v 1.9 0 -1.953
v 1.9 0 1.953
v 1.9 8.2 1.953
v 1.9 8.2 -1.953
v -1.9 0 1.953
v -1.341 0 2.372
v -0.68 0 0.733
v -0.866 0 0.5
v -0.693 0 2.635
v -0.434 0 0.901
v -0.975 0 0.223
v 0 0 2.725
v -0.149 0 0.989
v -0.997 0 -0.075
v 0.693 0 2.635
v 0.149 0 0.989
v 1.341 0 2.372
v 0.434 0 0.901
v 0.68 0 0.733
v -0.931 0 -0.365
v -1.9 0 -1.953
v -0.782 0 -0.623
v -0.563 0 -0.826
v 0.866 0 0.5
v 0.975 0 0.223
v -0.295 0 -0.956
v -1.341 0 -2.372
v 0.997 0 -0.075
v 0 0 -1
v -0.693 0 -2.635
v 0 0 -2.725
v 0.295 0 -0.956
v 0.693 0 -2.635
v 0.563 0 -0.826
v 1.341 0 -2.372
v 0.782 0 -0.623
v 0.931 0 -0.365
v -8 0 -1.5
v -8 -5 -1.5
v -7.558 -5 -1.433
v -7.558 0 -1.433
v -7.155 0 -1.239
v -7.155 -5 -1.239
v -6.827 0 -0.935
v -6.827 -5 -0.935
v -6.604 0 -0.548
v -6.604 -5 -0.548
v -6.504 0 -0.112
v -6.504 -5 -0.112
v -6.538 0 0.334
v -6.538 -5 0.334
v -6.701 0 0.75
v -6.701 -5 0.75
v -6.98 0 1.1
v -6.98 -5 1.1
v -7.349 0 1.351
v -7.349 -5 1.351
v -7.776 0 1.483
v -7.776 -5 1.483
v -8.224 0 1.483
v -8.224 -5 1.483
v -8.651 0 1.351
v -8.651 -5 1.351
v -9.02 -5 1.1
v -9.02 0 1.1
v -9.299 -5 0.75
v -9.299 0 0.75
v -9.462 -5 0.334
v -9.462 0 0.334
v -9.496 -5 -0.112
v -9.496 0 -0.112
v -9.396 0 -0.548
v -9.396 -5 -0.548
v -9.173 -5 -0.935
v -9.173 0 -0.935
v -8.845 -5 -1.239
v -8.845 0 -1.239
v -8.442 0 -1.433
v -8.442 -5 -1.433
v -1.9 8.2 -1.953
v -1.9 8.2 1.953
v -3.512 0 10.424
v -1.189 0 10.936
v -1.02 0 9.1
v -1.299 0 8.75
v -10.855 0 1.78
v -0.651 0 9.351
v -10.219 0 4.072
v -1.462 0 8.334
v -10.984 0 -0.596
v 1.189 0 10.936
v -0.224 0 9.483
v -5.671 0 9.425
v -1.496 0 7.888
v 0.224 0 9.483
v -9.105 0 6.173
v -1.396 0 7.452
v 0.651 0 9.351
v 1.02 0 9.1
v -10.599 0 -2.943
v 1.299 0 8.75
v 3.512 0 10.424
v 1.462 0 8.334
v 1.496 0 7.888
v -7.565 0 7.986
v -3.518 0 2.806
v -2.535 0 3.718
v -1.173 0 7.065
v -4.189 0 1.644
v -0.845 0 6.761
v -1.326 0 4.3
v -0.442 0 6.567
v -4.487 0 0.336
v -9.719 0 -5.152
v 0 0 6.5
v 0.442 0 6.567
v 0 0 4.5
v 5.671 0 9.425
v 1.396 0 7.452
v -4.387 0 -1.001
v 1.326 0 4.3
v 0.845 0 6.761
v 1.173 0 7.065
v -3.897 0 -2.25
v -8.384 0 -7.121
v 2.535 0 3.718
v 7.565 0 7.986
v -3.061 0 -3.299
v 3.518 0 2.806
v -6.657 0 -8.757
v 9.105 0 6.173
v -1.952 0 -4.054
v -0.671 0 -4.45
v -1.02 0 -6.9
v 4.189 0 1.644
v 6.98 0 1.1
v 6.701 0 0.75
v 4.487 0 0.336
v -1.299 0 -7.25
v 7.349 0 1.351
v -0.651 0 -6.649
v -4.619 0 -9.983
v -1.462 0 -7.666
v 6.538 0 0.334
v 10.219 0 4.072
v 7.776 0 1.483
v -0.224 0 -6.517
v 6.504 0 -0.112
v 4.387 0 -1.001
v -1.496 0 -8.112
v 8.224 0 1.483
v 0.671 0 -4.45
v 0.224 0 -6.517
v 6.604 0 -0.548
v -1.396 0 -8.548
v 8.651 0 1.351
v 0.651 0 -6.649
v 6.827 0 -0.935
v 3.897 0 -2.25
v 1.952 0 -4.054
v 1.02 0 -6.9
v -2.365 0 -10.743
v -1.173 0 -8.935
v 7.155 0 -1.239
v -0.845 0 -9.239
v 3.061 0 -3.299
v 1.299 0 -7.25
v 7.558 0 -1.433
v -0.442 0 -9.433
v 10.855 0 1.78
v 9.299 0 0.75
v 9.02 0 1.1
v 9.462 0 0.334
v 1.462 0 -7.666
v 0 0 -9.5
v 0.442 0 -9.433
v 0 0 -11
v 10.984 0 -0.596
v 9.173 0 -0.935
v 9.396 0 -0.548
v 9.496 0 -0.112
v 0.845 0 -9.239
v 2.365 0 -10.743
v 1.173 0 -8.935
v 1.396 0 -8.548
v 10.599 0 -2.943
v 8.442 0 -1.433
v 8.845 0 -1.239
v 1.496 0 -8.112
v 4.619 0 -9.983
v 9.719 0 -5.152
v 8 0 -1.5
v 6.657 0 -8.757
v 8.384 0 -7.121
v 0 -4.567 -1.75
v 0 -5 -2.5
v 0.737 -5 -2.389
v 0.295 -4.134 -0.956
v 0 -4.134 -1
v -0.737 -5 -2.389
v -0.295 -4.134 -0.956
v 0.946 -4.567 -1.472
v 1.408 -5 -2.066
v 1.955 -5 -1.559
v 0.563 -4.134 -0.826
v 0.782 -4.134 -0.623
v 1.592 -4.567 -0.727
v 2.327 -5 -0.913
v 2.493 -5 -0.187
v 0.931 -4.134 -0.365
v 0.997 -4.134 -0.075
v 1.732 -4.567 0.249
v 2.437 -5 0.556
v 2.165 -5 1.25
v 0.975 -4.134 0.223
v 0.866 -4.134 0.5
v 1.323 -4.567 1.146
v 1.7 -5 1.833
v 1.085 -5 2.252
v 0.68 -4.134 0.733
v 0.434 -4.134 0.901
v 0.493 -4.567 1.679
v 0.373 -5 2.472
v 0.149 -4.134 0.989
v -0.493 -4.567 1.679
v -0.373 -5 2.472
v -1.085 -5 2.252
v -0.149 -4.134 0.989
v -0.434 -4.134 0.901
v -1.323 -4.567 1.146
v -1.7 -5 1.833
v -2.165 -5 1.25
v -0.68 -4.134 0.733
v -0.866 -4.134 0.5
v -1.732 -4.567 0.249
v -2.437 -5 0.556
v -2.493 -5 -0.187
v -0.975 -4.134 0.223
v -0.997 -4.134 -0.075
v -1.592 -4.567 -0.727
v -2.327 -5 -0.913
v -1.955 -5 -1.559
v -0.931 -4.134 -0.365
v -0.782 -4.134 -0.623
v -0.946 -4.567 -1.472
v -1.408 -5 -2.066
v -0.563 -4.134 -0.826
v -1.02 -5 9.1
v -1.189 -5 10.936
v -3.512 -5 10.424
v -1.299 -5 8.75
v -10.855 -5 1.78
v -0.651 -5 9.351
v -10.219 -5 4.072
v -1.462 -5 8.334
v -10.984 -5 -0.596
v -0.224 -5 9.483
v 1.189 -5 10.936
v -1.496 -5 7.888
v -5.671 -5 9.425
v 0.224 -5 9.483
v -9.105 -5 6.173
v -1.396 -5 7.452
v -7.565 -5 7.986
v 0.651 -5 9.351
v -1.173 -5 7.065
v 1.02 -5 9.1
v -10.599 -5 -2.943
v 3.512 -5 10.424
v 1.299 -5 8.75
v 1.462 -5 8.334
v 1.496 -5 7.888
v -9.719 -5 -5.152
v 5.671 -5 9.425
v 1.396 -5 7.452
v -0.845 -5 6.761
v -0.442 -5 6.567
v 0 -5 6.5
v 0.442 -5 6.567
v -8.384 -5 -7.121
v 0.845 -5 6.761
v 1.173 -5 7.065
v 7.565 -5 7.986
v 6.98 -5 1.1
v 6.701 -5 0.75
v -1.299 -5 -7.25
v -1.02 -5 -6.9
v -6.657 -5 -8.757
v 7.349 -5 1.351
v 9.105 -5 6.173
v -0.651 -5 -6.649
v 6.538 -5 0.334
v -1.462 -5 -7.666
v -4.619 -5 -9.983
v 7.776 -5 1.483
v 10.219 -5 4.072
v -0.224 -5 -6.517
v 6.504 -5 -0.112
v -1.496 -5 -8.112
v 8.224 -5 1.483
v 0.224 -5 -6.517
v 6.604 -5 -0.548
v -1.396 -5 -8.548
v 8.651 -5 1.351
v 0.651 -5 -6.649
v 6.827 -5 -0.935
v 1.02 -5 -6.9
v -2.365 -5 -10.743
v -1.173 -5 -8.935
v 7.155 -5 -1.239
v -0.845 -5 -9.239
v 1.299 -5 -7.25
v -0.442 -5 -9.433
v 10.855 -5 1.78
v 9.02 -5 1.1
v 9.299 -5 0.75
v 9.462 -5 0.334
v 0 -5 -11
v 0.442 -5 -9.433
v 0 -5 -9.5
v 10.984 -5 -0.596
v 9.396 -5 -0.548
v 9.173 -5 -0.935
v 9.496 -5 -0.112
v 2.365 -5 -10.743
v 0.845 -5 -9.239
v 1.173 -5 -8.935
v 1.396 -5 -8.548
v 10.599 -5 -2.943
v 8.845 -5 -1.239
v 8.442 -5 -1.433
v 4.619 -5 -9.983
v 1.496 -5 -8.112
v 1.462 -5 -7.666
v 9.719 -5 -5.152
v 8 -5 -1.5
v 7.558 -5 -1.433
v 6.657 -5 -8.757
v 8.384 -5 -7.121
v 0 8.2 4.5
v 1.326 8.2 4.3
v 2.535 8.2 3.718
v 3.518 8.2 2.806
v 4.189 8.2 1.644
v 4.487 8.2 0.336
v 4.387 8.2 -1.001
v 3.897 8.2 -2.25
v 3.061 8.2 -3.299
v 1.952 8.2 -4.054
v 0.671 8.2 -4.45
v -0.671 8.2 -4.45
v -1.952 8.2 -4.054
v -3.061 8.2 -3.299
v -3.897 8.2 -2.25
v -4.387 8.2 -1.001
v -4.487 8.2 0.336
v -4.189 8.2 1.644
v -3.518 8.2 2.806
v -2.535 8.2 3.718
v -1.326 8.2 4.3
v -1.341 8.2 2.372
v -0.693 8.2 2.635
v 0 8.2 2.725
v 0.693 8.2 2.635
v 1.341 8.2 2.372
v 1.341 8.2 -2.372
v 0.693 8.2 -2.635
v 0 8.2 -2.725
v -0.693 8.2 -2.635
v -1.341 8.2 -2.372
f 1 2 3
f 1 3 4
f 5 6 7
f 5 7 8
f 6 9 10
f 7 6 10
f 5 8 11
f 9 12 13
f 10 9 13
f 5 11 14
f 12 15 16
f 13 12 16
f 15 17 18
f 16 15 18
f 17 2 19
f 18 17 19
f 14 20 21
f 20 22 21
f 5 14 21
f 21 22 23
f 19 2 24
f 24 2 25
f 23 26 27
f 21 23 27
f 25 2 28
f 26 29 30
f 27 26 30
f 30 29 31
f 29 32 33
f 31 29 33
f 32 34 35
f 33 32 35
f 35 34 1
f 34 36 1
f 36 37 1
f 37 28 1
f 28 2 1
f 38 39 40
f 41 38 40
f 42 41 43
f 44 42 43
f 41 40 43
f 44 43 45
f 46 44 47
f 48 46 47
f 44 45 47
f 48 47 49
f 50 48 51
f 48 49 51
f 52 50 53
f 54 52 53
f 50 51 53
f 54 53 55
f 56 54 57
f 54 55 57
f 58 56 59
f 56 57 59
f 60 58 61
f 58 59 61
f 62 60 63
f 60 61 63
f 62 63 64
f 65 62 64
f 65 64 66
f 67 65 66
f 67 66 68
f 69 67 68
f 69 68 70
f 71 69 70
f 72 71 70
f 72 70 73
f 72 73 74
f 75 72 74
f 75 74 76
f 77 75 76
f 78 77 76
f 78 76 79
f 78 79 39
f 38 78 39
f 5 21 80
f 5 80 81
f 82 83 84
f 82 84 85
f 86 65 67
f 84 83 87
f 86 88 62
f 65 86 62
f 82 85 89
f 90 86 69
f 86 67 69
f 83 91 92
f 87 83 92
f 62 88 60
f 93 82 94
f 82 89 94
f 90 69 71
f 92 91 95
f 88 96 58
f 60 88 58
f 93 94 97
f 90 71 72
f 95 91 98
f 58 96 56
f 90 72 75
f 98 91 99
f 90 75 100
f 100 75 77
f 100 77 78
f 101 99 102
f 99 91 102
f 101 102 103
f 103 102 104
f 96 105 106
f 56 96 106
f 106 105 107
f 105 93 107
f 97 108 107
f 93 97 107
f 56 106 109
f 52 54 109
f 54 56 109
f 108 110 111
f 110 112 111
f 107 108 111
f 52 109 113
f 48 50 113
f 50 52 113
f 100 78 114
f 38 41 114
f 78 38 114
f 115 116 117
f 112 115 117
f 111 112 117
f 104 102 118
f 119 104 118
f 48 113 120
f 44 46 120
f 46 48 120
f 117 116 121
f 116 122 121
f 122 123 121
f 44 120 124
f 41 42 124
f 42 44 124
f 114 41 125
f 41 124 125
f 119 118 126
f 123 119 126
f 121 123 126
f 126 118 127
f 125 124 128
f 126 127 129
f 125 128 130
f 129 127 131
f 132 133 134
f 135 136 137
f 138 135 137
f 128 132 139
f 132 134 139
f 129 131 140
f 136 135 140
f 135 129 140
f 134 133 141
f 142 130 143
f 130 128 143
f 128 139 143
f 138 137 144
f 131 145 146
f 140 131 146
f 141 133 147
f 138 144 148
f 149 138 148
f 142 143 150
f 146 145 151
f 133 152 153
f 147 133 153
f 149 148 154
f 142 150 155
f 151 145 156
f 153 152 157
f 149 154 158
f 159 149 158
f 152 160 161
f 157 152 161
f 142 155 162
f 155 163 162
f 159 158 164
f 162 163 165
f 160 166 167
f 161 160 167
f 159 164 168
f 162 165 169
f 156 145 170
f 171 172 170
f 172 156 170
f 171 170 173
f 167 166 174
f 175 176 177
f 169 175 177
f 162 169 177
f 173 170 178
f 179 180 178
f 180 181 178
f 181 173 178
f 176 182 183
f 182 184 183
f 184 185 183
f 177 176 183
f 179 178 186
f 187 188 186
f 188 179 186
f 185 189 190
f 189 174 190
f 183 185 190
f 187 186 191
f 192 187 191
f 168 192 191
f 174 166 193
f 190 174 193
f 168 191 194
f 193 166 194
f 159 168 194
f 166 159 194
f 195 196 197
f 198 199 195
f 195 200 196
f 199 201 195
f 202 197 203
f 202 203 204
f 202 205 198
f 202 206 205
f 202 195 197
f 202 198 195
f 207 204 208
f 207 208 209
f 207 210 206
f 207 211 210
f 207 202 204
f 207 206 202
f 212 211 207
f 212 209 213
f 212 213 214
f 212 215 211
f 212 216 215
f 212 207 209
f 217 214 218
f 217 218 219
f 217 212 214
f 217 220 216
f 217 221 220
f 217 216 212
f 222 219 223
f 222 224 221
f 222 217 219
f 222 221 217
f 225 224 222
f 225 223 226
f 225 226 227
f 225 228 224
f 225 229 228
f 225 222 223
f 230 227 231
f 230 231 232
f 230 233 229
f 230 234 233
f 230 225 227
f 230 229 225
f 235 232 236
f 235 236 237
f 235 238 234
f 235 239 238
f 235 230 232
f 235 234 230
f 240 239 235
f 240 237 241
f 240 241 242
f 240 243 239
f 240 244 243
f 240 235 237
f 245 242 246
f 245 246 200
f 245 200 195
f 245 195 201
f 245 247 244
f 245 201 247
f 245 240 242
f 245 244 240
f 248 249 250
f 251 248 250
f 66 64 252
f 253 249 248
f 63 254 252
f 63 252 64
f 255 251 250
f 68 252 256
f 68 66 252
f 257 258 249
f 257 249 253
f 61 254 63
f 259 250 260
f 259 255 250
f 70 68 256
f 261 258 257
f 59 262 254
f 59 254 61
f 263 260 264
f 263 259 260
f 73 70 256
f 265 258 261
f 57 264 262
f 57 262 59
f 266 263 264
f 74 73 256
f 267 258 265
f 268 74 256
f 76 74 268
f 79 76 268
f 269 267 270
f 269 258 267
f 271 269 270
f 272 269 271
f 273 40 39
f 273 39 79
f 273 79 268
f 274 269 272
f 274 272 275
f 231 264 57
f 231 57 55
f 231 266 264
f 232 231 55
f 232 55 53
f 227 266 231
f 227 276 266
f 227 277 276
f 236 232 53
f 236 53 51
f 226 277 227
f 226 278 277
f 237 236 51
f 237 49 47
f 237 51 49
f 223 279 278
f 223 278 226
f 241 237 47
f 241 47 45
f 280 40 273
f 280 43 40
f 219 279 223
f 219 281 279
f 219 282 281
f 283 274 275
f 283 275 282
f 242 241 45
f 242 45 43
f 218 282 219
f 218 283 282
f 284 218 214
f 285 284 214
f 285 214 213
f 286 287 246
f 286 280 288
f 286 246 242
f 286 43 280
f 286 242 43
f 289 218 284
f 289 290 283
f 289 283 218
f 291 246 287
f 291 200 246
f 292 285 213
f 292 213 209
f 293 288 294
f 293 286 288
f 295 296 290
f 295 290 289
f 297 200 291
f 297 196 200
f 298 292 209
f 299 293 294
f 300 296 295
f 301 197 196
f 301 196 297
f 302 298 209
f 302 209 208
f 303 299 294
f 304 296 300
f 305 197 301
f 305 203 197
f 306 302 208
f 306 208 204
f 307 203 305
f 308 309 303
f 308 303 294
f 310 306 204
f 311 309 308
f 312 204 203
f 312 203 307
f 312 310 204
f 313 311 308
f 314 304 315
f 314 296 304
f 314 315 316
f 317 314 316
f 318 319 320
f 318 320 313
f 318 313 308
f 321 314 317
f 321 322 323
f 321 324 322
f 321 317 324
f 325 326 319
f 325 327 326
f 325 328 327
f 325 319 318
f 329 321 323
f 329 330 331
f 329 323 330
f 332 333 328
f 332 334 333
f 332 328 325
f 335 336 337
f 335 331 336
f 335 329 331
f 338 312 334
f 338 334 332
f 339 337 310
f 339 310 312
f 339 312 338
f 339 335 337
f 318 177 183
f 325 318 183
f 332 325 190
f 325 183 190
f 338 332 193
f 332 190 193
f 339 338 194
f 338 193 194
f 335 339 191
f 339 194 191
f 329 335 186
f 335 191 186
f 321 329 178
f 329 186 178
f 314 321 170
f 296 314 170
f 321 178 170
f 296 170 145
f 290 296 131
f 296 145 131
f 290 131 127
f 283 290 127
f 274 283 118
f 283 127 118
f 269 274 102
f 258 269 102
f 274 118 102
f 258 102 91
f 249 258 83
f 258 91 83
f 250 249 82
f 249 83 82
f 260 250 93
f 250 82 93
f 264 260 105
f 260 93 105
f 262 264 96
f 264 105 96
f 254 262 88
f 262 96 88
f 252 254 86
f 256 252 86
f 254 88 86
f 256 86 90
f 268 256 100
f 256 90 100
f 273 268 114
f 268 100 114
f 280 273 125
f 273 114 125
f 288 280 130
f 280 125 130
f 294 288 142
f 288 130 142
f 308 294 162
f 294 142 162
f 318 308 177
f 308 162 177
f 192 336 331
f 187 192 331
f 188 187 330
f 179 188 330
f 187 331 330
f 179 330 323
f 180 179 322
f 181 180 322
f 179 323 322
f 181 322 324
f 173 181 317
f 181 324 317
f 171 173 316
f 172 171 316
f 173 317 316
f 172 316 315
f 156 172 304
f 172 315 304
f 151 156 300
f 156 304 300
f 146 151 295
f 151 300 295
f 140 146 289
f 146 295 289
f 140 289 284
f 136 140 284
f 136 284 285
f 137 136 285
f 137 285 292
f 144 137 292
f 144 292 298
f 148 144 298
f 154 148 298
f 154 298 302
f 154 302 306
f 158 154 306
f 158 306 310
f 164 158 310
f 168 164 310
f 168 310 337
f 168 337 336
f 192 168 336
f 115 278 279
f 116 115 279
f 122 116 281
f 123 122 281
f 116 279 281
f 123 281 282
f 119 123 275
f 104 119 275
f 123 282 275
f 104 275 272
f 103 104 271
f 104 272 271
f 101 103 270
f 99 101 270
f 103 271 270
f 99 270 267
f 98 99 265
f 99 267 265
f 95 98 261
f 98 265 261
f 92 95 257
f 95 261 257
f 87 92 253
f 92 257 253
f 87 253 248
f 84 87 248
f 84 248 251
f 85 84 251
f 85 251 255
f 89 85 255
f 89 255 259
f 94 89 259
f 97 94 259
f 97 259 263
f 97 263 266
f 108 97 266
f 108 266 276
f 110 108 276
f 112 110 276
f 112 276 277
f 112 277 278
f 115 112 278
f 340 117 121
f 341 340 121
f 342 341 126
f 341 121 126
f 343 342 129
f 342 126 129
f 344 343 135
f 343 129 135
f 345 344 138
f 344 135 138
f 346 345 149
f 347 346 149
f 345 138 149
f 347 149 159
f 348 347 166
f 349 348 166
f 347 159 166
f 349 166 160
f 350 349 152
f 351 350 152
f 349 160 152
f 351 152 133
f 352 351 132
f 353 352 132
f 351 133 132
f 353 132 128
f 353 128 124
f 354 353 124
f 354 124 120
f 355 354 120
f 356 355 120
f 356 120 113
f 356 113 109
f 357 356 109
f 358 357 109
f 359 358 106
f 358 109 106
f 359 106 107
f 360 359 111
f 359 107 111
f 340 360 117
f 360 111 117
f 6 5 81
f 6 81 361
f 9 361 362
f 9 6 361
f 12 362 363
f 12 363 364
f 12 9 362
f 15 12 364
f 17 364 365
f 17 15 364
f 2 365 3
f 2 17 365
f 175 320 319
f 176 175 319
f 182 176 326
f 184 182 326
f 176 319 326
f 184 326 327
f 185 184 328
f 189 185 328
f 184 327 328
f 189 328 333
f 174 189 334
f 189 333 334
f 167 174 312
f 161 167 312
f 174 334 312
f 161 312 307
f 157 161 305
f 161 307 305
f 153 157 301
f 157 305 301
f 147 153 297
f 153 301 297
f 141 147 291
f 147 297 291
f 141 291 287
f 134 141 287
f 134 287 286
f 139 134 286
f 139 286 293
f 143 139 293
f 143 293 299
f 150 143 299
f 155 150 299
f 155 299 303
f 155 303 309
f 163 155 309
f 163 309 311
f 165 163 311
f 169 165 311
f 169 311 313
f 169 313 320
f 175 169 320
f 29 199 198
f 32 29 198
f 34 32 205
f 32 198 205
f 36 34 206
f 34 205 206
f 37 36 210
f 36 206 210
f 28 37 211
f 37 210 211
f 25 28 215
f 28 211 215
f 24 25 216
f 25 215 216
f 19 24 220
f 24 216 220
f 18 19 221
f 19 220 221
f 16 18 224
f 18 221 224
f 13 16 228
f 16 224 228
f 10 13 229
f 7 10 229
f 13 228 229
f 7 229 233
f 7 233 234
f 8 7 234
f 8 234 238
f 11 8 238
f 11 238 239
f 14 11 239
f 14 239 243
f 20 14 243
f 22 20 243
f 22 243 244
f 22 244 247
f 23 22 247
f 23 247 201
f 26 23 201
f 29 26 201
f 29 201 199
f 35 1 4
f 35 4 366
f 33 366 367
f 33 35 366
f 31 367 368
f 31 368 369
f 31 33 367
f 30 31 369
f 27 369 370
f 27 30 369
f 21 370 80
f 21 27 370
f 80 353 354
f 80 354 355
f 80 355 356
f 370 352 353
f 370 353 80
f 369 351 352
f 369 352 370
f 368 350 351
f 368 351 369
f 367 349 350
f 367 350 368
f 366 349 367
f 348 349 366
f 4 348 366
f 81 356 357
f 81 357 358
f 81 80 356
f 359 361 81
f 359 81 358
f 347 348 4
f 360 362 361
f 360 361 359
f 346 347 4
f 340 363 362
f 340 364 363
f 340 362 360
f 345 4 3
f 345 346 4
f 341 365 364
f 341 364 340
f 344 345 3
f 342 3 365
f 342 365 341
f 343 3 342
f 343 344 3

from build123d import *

# Parameters (mm, degrees)
SKETCH1_R           = 4.5
BOSS_EXTRUDE1_DEPTH = 8.2
SKETCH2_R           = 11
BOSS_EXTRUDE2_DEPTH = 5
SKETCH3_R           = 1
CUT_EXTRUDE1_DEPTH  = 21.40196069
SKETCH4_R           = 1.5
CUT_EXTRUDE2_DEPTH  = 21.40196069
CHAMFER1_SIZE       = 1.5
CHAMFER1_SIZE2      = 0.866025404


with BuildPart() as part:
    # Sketch1 → Boss-Extrude1 (new body)
    with BuildSketch(Plane(origin=(0, 0, 0), x_dir=(1, 0, 0), z_dir=(0, 1, 0))):
        Circle(SKETCH1_R)
        with BuildLine():
            Line((-1.9, 1.953362486), (-1.9, -1.953362486))
            ThreePointArc((-1.9, -1.953362486), (0, -2.725), (1.9, -1.953362486))
            Line((1.9, -1.953362486), (1.9, 1.953362486))
            ThreePointArc((1.9, 1.953362486), (0, 2.725), (-1.9, 1.953362486))
        make_face(mode=Mode.SUBTRACT)
    extrude(amount=BOSS_EXTRUDE1_DEPTH)

    # Sketch2 → Boss-Extrude2 (add)
    with BuildSketch(Plane.XZ):
        Circle(SKETCH2_R)
    extrude(amount=BOSS_EXTRUDE2_DEPTH)

    # Sketch3 → Cut-Extrude1 (cut, through all)
    with BuildSketch(Plane.XZ.offset(5)):
        Circle(SKETCH3_R)
    extrude(amount=-CUT_EXTRUDE1_DEPTH, mode=Mode.SUBTRACT)

    # Sketch4 → Cut-Extrude2 (cut, through all)
    with BuildSketch(Plane.XZ.offset(5)):
        with Locations((0, 8)):
            Circle(SKETCH4_R)
        with Locations((-8, 0)):
            Circle(SKETCH4_R)
        with Locations((0, -8)):
            Circle(SKETCH4_R)
        with Locations((8, 0)):
            Circle(SKETCH4_R)
    extrude(amount=-CUT_EXTRUDE2_DEPTH, mode=Mode.SUBTRACT)

    # Chamfer1
    chamfer1_edges = [part.edges().sort_by_distance(p)[0] for p in [
        (-1, -5, 0),
    ]]
    chamfer1_side = [part.faces().sort_by_distance(p)[0] for p in [
        (-10.688873016, -5, 0),
    ]]
    chamfer(chamfer1_edges, length=CHAMFER1_SIZE, length2=CHAMFER1_SIZE2, reference=chamfer1_side[0])


solid = part.part
